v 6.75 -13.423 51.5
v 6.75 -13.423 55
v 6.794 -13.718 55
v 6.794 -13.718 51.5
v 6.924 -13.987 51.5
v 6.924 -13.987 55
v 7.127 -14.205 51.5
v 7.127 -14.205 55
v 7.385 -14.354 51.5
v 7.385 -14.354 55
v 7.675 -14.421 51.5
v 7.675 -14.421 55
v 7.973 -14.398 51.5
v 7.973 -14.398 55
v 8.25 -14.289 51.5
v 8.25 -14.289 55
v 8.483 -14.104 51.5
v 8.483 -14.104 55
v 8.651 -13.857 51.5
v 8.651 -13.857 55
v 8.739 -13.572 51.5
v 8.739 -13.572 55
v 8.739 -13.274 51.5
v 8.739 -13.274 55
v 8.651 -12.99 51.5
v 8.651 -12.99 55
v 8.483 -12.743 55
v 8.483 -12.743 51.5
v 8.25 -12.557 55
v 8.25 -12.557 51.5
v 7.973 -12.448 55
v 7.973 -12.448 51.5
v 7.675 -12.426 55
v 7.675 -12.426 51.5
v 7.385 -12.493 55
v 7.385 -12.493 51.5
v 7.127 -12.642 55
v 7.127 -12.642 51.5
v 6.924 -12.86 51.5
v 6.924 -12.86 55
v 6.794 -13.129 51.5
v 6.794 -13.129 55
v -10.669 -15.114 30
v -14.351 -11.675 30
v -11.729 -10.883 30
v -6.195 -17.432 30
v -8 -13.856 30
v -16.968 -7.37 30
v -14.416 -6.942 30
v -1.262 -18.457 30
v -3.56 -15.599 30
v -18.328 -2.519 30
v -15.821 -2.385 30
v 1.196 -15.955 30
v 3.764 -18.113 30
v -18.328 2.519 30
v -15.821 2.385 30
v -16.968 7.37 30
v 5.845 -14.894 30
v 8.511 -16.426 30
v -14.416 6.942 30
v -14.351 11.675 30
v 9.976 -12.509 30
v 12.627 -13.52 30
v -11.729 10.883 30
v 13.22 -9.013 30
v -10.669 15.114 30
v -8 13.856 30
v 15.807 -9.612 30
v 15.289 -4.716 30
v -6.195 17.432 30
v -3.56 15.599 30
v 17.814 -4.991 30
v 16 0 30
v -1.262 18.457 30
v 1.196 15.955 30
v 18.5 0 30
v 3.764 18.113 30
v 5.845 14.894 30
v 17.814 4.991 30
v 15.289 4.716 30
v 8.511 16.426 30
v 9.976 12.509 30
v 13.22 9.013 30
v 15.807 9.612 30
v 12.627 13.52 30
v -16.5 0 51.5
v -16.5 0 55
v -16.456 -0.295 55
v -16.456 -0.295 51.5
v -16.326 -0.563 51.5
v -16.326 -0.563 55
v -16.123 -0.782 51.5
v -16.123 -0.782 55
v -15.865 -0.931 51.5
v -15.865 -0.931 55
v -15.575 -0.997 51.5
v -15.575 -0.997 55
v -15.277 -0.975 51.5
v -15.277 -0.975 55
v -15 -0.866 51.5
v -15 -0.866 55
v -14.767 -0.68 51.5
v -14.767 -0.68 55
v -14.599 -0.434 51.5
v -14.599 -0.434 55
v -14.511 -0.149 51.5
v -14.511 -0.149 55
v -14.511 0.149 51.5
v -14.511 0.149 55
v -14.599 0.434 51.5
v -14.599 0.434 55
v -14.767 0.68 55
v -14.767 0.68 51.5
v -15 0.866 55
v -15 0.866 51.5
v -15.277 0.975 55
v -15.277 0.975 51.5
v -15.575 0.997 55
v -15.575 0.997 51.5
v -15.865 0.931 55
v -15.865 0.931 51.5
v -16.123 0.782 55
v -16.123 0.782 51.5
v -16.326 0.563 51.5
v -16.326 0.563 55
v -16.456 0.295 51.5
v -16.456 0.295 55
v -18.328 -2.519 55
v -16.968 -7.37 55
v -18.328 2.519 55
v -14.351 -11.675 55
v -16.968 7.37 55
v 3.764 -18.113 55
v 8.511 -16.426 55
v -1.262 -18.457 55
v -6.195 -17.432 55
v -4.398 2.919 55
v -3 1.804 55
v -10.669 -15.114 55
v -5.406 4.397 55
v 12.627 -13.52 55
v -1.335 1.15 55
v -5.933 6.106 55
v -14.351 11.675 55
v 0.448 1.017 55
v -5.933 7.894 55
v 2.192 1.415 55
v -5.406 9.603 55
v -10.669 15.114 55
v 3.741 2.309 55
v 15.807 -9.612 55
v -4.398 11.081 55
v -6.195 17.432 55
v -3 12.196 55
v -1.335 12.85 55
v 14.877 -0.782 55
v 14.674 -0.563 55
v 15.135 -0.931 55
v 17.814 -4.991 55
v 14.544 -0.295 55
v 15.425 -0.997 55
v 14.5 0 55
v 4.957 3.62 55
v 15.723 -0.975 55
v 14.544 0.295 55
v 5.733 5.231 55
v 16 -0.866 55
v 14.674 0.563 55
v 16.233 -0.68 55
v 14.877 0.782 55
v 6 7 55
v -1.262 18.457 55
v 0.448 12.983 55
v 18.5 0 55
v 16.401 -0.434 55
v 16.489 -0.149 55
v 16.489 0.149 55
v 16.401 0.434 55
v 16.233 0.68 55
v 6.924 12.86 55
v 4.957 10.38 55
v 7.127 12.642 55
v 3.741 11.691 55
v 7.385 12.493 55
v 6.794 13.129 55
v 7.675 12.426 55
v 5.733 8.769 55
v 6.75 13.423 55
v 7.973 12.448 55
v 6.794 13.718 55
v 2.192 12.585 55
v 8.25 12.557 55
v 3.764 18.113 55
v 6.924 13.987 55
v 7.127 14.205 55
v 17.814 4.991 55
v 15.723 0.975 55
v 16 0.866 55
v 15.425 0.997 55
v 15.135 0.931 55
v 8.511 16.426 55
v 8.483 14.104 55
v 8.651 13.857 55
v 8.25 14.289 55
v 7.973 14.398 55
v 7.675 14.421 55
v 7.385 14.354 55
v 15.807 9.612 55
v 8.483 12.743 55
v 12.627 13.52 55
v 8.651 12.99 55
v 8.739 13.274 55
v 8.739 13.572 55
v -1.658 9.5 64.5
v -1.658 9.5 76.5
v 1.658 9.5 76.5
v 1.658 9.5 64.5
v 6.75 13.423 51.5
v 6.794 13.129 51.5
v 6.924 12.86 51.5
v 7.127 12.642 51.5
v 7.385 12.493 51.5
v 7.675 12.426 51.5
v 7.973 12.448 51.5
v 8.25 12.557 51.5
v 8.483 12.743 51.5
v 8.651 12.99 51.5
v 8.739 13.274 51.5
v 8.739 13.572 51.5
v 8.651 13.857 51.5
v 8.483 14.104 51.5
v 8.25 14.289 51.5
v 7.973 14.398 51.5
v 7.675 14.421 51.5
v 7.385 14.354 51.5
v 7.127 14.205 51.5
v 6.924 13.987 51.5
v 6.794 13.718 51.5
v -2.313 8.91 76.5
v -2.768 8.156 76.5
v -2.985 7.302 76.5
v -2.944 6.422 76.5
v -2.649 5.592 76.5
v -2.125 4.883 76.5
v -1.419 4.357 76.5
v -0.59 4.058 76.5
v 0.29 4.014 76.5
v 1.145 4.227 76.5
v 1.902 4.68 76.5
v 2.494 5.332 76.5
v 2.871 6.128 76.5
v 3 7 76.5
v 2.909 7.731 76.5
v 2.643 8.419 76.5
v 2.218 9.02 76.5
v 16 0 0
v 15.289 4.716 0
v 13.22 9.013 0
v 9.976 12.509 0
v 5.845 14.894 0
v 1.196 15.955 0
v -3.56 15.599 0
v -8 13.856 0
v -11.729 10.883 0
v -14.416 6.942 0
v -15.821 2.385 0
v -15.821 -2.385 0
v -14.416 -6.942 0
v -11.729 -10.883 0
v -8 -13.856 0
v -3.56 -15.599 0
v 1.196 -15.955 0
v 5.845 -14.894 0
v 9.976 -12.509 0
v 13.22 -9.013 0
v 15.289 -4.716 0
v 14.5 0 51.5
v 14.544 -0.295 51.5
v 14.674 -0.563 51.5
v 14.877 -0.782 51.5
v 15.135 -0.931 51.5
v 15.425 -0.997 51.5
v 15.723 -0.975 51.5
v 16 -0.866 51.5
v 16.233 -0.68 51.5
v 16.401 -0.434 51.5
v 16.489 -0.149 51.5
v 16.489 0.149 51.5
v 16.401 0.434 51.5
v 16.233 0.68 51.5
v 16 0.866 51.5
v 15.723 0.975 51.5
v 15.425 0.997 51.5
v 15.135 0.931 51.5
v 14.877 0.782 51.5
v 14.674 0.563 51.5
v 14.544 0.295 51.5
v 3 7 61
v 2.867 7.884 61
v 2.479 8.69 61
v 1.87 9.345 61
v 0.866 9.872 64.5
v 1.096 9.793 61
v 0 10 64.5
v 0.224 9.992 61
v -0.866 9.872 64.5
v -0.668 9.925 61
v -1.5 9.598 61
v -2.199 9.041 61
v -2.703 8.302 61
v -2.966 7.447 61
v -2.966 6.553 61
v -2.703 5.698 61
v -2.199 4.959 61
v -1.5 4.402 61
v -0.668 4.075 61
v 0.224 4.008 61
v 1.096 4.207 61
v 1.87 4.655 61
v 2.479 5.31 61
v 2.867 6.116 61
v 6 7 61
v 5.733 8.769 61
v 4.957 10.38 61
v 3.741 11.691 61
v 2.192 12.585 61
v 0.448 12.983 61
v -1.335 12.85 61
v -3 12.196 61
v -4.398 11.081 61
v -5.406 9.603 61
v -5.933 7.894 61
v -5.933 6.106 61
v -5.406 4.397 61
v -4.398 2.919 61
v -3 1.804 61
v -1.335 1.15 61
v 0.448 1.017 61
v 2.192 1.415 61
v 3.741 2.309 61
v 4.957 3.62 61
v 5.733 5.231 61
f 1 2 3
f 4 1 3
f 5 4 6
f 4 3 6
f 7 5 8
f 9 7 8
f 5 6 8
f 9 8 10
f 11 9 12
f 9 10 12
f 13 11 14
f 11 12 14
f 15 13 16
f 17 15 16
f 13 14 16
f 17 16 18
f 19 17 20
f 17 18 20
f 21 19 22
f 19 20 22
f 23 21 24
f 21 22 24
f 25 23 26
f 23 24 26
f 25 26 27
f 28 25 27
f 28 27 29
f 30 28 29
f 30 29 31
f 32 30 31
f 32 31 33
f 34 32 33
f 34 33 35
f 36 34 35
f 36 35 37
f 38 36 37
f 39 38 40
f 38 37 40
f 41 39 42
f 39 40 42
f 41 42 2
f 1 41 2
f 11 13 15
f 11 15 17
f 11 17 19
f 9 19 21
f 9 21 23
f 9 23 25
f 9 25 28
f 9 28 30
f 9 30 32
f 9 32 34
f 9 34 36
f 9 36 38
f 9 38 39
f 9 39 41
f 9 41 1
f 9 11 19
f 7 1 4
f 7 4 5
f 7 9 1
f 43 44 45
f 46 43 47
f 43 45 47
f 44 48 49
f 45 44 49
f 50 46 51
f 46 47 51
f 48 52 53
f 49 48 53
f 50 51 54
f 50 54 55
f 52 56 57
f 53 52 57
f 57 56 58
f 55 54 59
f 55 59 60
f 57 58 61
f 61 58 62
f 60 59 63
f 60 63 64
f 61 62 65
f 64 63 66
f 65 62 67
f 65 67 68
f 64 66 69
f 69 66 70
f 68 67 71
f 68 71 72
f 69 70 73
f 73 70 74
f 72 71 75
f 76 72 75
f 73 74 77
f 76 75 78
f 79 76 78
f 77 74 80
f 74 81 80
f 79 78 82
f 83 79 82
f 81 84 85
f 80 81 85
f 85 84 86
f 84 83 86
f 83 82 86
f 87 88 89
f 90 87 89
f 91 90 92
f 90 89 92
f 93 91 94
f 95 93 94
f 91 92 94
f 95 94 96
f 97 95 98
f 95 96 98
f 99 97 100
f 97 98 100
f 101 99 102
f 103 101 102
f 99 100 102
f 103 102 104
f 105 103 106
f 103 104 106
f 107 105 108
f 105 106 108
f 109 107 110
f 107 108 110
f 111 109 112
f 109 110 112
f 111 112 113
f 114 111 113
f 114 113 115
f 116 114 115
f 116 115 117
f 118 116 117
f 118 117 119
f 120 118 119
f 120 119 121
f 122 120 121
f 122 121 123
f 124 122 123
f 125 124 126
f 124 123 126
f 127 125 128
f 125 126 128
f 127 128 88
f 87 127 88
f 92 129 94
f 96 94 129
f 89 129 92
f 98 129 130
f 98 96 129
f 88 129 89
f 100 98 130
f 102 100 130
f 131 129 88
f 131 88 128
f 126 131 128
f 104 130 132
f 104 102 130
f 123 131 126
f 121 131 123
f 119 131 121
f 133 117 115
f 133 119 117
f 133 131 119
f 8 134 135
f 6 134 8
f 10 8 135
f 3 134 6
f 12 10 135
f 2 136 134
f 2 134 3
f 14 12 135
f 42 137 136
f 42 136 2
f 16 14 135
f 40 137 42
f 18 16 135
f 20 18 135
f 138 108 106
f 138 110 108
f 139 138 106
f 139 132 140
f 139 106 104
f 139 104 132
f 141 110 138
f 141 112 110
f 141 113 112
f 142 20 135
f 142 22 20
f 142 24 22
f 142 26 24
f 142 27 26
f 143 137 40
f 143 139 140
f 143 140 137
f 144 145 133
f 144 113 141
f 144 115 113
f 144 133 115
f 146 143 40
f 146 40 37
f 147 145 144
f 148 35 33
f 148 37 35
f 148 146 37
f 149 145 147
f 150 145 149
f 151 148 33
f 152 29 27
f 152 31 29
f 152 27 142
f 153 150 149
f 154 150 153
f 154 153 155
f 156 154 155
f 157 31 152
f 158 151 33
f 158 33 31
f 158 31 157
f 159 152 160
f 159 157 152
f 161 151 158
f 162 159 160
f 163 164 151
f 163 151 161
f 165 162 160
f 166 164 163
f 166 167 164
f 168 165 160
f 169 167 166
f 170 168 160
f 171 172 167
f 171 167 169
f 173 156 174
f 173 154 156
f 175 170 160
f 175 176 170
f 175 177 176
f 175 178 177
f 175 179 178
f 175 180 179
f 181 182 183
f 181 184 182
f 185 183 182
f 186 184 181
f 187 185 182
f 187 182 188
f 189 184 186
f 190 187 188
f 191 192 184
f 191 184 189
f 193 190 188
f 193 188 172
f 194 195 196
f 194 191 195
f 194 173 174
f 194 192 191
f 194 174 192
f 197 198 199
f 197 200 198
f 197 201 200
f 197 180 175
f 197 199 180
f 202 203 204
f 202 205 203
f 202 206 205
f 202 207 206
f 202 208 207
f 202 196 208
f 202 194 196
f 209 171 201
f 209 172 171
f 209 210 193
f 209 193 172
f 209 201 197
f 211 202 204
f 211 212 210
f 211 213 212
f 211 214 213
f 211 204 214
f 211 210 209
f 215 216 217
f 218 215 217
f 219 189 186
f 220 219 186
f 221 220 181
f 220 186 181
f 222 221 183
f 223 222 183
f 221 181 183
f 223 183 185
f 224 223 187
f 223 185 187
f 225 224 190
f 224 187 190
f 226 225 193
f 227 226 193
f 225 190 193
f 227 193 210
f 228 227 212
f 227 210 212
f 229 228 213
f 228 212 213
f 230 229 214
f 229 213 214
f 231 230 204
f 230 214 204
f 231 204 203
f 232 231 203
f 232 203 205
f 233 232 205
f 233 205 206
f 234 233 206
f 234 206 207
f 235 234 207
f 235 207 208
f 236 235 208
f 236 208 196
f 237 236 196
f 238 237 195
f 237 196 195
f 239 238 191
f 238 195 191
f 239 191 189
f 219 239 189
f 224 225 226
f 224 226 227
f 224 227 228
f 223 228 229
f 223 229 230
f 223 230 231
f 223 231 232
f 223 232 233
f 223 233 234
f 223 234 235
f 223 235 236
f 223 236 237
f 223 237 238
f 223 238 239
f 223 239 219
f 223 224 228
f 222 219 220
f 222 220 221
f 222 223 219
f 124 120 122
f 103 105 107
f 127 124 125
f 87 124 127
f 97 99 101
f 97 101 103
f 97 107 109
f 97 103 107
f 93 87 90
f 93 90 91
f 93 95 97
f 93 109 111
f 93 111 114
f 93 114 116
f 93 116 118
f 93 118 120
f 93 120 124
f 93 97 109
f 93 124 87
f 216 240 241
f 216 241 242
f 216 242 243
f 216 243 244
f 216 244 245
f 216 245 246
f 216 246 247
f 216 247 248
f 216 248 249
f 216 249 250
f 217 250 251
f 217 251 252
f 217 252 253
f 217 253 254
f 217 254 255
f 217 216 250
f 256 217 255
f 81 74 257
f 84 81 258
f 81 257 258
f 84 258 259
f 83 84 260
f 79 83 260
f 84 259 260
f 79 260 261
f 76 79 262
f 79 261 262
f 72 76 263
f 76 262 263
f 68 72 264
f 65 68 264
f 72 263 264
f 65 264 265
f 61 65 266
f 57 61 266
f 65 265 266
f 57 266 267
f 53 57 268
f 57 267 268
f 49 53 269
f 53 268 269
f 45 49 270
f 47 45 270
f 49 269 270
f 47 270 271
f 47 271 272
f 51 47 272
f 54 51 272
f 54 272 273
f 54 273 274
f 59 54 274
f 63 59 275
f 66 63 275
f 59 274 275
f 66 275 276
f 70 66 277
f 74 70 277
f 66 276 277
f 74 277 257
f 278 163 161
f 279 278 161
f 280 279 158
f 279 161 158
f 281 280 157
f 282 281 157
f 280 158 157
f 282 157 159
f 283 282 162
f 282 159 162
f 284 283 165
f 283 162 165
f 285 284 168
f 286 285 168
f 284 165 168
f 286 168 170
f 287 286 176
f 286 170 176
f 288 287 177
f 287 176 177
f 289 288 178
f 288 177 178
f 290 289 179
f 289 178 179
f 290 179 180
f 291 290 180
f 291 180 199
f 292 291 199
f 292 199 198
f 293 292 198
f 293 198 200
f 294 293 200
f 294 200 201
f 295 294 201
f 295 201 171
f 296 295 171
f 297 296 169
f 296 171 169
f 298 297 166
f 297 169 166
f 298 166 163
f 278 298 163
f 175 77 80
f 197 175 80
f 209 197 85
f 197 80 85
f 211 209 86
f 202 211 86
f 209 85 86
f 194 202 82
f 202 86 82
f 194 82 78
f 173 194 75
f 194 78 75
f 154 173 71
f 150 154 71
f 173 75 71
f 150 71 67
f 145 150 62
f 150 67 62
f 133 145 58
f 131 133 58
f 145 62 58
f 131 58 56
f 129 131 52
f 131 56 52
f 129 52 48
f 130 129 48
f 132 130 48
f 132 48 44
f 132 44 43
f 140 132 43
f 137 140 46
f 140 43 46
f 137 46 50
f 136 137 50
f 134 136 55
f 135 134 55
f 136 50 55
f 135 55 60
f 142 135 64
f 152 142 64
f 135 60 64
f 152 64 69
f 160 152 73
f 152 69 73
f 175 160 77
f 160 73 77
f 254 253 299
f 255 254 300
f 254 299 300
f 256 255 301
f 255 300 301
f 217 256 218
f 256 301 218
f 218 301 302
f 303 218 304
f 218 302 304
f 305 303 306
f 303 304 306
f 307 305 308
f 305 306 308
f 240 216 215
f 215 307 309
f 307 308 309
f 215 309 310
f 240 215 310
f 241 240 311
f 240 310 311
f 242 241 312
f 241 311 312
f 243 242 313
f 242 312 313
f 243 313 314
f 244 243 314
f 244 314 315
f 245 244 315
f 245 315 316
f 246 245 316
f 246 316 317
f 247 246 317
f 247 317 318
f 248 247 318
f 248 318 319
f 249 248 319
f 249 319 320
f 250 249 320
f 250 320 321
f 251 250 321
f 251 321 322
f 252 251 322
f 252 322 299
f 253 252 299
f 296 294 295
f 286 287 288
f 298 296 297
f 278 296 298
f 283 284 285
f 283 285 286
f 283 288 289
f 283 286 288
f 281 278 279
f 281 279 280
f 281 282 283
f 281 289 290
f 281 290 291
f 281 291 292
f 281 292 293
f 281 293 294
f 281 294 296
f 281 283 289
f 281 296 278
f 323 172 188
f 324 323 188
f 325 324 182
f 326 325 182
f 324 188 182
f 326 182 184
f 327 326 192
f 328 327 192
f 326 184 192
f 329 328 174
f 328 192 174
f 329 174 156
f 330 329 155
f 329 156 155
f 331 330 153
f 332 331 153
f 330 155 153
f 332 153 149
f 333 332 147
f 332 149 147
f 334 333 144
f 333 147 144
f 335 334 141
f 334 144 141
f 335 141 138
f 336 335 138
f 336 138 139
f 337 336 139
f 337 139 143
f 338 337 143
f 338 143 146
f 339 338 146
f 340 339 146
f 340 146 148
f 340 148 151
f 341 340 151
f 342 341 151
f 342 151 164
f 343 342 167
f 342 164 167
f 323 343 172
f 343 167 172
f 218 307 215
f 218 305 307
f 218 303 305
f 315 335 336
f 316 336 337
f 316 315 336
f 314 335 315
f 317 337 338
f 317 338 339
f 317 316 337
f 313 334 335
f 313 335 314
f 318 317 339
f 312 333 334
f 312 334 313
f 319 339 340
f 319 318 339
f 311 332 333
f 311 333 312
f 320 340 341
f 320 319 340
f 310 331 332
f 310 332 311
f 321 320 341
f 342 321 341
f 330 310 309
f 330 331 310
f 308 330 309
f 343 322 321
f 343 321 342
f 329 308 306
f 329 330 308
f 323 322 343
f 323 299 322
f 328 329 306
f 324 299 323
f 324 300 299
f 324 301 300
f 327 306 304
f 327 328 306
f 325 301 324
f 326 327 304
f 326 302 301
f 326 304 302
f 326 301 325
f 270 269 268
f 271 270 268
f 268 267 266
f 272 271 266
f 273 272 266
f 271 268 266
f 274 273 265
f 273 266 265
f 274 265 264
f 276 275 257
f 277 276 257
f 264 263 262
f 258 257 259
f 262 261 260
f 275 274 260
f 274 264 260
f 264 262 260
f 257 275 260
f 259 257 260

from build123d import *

# Parameters (mm, degrees)
ESQUISSE1_R             = 16
BOSS_EXTRU_2_DEPTH      = 30
ESQUISSE2_R             = 18.5
BOSS_EXTRU_3_DEPTH      = 25
ESQUISSE3_R             = 1
ENL_V_MAT_EXTRU_1_DEPTH = 3.5
ESQUISSE5_R             = 6
BOSS_EXTRU_4_DEPTH      = 6
ESQUISSE6_R             = 3
BOSS_EXTRU_5_DEPTH      = 15.5
ESQUISSE7_W             = 7.308646468
ESQUISSE7_H             = 1
ENL_V_MAT_EXTRU_2_DEPTH = 12


with BuildPart() as part:
    # Esquisse1 → Boss.-Extru.2 (new body)
    with BuildSketch(Plane.XY):
        Circle(ESQUISSE1_R)
    extrude(amount=BOSS_EXTRU_2_DEPTH)

    # Esquisse2 → Boss.-Extru.3 (add)
    with BuildSketch(Plane.XY.offset(30)):
        Circle(ESQUISSE2_R)
    extrude(amount=BOSS_EXTRU_3_DEPTH)

    # Esquisse3 → Enlèv. mat.-Extru.1 (cut)
    with BuildSketch(Plane.XY.offset(55)):
        with Locations(Location((-15.5, 0, 0), (0, 0, 180))):
            Circle(ESQUISSE3_R)
        with Locations(Location((7.75, -13.423393759, 0), (0, 0, 180))):
            Circle(ESQUISSE3_R)
        with Locations(Location((15.5, 0, 0), (0, 0, 180))):
            Circle(ESQUISSE3_R)
        with Locations(Location((7.75, 13.423393759, 0), (0, 0, 180))):
            Circle(ESQUISSE3_R)
    extrude(amount=-ENL_V_MAT_EXTRU_1_DEPTH, mode=Mode.SUBTRACT)

    # Esquisse5 → Boss.-Extru.4 (add)
    with BuildSketch(Plane.XY.offset(55)):
        with Locations((0, 7)):
            Circle(ESQUISSE5_R)
    extrude(amount=BOSS_EXTRU_4_DEPTH)

    # Esquisse6 → Boss.-Extru.5 (add)
    with BuildSketch(Plane.XY.offset(61)):
        with Locations((0, 7)):
            Circle(ESQUISSE6_R)
    extrude(amount=BOSS_EXTRU_5_DEPTH)

    # Esquisse7 → Enlèv. mat.-Extru.2 (cut)
    with BuildSketch(Plane.XY.offset(76.5)):
        with Locations((0, 10)):
            Rectangle(ESQUISSE7_W, ESQUISSE7_H)
    extrude(amount=-ENL_V_MAT_EXTRU_2_DEPTH, mode=Mode.SUBTRACT)


solid = part.part
